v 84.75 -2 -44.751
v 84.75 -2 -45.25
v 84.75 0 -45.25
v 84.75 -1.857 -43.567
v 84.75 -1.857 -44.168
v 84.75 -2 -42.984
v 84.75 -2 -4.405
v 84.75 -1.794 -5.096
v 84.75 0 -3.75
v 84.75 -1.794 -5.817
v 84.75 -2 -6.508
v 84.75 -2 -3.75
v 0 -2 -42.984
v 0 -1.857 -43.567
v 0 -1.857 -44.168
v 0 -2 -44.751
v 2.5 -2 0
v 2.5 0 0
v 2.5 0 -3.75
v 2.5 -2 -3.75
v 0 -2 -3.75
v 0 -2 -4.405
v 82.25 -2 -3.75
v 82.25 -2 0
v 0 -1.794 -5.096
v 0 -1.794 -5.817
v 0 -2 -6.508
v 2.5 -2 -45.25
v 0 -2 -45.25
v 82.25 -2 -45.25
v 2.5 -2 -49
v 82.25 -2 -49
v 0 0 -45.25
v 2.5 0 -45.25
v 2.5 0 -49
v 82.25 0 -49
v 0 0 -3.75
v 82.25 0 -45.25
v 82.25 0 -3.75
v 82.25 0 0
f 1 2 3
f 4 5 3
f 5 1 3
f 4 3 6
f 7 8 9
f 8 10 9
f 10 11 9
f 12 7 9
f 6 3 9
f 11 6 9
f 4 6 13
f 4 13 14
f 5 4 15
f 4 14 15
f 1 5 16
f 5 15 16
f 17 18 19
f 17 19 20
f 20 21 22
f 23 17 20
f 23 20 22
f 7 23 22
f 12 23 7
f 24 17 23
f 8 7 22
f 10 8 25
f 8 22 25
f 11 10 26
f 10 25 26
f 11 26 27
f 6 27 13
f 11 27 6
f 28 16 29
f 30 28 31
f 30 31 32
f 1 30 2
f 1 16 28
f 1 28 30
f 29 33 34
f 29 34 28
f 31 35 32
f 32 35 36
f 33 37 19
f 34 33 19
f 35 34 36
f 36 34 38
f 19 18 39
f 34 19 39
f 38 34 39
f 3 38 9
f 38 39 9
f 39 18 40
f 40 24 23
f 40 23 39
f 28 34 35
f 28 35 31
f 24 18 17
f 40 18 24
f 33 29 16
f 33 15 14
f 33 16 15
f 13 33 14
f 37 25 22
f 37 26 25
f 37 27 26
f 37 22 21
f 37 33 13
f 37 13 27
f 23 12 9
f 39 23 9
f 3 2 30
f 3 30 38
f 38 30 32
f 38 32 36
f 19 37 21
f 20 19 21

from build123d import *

# Parameters (mm, degrees)
F0_W      = 1695
F0_H      = 980
F1_DEPTH  = 40
F2_R      = 50
F3_DEPTH  = 1695.001
F6_W      = 40
F6_H      = 75
F7_DEPTH  = 50
F8_W      = 40
F8_H      = 75
F9_DEPTH  = 50
F10_SCALE = 0.05


# Not quite as in the source:
# - a feature of the source that left no trace in its solid (it failed there, or was rolled back) is left out


with BuildPart() as f1:
    # F0 (on Front) → F1 (new body)
    with BuildSketch(Plane.XZ):
        with Locations((847.5, -490)):
            Rectangle(F0_W, F0_H)
    extrude(amount=F1_DEPTH)

    # F2 (on face) → F3 (cut, through all)
    with BuildSketch(Plane(origin=(0, 0, 0), x_dir=(0, -1, 0), z_dir=(-1, 0, 0))):
        with Locations((85.3642523289, -109.1325581074)):
            Circle(F2_R)
        with Locations((86.7706388235, -877.3503899574)):
            Circle(F2_R)
    extrude(amount=-F3_DEPTH, mode=Mode.SUBTRACT)

    # F6 (on face) → F7 (cut)
    with BuildSketch(Plane(origin=(0, 0, 0), x_dir=(0, -1, 0), z_dir=(-1, 0, 0))):
        with Locations((20, -37.5)):
            Rectangle(F6_W, F6_H)
        with Locations((20, -942.5)):
            Rectangle(F6_W, F6_H)
    extrude(amount=-F7_DEPTH, mode=Mode.SUBTRACT)

    # F8 (on face) → F9 (cut)
    with BuildSketch(Plane.YZ.offset(1695)):
        with Locations((-20, -37.5)):
            Rectangle(F8_W, F8_H)
        with Locations((-20, -942.5)):
            Rectangle(F8_W, F8_H)
    extrude(amount=-F9_DEPTH, mode=Mode.SUBTRACT)


with BuildPart() as f1_1:
    # F10: moved
    add(f1.part.scale(F10_SCALE))


solid = f1_1.part
